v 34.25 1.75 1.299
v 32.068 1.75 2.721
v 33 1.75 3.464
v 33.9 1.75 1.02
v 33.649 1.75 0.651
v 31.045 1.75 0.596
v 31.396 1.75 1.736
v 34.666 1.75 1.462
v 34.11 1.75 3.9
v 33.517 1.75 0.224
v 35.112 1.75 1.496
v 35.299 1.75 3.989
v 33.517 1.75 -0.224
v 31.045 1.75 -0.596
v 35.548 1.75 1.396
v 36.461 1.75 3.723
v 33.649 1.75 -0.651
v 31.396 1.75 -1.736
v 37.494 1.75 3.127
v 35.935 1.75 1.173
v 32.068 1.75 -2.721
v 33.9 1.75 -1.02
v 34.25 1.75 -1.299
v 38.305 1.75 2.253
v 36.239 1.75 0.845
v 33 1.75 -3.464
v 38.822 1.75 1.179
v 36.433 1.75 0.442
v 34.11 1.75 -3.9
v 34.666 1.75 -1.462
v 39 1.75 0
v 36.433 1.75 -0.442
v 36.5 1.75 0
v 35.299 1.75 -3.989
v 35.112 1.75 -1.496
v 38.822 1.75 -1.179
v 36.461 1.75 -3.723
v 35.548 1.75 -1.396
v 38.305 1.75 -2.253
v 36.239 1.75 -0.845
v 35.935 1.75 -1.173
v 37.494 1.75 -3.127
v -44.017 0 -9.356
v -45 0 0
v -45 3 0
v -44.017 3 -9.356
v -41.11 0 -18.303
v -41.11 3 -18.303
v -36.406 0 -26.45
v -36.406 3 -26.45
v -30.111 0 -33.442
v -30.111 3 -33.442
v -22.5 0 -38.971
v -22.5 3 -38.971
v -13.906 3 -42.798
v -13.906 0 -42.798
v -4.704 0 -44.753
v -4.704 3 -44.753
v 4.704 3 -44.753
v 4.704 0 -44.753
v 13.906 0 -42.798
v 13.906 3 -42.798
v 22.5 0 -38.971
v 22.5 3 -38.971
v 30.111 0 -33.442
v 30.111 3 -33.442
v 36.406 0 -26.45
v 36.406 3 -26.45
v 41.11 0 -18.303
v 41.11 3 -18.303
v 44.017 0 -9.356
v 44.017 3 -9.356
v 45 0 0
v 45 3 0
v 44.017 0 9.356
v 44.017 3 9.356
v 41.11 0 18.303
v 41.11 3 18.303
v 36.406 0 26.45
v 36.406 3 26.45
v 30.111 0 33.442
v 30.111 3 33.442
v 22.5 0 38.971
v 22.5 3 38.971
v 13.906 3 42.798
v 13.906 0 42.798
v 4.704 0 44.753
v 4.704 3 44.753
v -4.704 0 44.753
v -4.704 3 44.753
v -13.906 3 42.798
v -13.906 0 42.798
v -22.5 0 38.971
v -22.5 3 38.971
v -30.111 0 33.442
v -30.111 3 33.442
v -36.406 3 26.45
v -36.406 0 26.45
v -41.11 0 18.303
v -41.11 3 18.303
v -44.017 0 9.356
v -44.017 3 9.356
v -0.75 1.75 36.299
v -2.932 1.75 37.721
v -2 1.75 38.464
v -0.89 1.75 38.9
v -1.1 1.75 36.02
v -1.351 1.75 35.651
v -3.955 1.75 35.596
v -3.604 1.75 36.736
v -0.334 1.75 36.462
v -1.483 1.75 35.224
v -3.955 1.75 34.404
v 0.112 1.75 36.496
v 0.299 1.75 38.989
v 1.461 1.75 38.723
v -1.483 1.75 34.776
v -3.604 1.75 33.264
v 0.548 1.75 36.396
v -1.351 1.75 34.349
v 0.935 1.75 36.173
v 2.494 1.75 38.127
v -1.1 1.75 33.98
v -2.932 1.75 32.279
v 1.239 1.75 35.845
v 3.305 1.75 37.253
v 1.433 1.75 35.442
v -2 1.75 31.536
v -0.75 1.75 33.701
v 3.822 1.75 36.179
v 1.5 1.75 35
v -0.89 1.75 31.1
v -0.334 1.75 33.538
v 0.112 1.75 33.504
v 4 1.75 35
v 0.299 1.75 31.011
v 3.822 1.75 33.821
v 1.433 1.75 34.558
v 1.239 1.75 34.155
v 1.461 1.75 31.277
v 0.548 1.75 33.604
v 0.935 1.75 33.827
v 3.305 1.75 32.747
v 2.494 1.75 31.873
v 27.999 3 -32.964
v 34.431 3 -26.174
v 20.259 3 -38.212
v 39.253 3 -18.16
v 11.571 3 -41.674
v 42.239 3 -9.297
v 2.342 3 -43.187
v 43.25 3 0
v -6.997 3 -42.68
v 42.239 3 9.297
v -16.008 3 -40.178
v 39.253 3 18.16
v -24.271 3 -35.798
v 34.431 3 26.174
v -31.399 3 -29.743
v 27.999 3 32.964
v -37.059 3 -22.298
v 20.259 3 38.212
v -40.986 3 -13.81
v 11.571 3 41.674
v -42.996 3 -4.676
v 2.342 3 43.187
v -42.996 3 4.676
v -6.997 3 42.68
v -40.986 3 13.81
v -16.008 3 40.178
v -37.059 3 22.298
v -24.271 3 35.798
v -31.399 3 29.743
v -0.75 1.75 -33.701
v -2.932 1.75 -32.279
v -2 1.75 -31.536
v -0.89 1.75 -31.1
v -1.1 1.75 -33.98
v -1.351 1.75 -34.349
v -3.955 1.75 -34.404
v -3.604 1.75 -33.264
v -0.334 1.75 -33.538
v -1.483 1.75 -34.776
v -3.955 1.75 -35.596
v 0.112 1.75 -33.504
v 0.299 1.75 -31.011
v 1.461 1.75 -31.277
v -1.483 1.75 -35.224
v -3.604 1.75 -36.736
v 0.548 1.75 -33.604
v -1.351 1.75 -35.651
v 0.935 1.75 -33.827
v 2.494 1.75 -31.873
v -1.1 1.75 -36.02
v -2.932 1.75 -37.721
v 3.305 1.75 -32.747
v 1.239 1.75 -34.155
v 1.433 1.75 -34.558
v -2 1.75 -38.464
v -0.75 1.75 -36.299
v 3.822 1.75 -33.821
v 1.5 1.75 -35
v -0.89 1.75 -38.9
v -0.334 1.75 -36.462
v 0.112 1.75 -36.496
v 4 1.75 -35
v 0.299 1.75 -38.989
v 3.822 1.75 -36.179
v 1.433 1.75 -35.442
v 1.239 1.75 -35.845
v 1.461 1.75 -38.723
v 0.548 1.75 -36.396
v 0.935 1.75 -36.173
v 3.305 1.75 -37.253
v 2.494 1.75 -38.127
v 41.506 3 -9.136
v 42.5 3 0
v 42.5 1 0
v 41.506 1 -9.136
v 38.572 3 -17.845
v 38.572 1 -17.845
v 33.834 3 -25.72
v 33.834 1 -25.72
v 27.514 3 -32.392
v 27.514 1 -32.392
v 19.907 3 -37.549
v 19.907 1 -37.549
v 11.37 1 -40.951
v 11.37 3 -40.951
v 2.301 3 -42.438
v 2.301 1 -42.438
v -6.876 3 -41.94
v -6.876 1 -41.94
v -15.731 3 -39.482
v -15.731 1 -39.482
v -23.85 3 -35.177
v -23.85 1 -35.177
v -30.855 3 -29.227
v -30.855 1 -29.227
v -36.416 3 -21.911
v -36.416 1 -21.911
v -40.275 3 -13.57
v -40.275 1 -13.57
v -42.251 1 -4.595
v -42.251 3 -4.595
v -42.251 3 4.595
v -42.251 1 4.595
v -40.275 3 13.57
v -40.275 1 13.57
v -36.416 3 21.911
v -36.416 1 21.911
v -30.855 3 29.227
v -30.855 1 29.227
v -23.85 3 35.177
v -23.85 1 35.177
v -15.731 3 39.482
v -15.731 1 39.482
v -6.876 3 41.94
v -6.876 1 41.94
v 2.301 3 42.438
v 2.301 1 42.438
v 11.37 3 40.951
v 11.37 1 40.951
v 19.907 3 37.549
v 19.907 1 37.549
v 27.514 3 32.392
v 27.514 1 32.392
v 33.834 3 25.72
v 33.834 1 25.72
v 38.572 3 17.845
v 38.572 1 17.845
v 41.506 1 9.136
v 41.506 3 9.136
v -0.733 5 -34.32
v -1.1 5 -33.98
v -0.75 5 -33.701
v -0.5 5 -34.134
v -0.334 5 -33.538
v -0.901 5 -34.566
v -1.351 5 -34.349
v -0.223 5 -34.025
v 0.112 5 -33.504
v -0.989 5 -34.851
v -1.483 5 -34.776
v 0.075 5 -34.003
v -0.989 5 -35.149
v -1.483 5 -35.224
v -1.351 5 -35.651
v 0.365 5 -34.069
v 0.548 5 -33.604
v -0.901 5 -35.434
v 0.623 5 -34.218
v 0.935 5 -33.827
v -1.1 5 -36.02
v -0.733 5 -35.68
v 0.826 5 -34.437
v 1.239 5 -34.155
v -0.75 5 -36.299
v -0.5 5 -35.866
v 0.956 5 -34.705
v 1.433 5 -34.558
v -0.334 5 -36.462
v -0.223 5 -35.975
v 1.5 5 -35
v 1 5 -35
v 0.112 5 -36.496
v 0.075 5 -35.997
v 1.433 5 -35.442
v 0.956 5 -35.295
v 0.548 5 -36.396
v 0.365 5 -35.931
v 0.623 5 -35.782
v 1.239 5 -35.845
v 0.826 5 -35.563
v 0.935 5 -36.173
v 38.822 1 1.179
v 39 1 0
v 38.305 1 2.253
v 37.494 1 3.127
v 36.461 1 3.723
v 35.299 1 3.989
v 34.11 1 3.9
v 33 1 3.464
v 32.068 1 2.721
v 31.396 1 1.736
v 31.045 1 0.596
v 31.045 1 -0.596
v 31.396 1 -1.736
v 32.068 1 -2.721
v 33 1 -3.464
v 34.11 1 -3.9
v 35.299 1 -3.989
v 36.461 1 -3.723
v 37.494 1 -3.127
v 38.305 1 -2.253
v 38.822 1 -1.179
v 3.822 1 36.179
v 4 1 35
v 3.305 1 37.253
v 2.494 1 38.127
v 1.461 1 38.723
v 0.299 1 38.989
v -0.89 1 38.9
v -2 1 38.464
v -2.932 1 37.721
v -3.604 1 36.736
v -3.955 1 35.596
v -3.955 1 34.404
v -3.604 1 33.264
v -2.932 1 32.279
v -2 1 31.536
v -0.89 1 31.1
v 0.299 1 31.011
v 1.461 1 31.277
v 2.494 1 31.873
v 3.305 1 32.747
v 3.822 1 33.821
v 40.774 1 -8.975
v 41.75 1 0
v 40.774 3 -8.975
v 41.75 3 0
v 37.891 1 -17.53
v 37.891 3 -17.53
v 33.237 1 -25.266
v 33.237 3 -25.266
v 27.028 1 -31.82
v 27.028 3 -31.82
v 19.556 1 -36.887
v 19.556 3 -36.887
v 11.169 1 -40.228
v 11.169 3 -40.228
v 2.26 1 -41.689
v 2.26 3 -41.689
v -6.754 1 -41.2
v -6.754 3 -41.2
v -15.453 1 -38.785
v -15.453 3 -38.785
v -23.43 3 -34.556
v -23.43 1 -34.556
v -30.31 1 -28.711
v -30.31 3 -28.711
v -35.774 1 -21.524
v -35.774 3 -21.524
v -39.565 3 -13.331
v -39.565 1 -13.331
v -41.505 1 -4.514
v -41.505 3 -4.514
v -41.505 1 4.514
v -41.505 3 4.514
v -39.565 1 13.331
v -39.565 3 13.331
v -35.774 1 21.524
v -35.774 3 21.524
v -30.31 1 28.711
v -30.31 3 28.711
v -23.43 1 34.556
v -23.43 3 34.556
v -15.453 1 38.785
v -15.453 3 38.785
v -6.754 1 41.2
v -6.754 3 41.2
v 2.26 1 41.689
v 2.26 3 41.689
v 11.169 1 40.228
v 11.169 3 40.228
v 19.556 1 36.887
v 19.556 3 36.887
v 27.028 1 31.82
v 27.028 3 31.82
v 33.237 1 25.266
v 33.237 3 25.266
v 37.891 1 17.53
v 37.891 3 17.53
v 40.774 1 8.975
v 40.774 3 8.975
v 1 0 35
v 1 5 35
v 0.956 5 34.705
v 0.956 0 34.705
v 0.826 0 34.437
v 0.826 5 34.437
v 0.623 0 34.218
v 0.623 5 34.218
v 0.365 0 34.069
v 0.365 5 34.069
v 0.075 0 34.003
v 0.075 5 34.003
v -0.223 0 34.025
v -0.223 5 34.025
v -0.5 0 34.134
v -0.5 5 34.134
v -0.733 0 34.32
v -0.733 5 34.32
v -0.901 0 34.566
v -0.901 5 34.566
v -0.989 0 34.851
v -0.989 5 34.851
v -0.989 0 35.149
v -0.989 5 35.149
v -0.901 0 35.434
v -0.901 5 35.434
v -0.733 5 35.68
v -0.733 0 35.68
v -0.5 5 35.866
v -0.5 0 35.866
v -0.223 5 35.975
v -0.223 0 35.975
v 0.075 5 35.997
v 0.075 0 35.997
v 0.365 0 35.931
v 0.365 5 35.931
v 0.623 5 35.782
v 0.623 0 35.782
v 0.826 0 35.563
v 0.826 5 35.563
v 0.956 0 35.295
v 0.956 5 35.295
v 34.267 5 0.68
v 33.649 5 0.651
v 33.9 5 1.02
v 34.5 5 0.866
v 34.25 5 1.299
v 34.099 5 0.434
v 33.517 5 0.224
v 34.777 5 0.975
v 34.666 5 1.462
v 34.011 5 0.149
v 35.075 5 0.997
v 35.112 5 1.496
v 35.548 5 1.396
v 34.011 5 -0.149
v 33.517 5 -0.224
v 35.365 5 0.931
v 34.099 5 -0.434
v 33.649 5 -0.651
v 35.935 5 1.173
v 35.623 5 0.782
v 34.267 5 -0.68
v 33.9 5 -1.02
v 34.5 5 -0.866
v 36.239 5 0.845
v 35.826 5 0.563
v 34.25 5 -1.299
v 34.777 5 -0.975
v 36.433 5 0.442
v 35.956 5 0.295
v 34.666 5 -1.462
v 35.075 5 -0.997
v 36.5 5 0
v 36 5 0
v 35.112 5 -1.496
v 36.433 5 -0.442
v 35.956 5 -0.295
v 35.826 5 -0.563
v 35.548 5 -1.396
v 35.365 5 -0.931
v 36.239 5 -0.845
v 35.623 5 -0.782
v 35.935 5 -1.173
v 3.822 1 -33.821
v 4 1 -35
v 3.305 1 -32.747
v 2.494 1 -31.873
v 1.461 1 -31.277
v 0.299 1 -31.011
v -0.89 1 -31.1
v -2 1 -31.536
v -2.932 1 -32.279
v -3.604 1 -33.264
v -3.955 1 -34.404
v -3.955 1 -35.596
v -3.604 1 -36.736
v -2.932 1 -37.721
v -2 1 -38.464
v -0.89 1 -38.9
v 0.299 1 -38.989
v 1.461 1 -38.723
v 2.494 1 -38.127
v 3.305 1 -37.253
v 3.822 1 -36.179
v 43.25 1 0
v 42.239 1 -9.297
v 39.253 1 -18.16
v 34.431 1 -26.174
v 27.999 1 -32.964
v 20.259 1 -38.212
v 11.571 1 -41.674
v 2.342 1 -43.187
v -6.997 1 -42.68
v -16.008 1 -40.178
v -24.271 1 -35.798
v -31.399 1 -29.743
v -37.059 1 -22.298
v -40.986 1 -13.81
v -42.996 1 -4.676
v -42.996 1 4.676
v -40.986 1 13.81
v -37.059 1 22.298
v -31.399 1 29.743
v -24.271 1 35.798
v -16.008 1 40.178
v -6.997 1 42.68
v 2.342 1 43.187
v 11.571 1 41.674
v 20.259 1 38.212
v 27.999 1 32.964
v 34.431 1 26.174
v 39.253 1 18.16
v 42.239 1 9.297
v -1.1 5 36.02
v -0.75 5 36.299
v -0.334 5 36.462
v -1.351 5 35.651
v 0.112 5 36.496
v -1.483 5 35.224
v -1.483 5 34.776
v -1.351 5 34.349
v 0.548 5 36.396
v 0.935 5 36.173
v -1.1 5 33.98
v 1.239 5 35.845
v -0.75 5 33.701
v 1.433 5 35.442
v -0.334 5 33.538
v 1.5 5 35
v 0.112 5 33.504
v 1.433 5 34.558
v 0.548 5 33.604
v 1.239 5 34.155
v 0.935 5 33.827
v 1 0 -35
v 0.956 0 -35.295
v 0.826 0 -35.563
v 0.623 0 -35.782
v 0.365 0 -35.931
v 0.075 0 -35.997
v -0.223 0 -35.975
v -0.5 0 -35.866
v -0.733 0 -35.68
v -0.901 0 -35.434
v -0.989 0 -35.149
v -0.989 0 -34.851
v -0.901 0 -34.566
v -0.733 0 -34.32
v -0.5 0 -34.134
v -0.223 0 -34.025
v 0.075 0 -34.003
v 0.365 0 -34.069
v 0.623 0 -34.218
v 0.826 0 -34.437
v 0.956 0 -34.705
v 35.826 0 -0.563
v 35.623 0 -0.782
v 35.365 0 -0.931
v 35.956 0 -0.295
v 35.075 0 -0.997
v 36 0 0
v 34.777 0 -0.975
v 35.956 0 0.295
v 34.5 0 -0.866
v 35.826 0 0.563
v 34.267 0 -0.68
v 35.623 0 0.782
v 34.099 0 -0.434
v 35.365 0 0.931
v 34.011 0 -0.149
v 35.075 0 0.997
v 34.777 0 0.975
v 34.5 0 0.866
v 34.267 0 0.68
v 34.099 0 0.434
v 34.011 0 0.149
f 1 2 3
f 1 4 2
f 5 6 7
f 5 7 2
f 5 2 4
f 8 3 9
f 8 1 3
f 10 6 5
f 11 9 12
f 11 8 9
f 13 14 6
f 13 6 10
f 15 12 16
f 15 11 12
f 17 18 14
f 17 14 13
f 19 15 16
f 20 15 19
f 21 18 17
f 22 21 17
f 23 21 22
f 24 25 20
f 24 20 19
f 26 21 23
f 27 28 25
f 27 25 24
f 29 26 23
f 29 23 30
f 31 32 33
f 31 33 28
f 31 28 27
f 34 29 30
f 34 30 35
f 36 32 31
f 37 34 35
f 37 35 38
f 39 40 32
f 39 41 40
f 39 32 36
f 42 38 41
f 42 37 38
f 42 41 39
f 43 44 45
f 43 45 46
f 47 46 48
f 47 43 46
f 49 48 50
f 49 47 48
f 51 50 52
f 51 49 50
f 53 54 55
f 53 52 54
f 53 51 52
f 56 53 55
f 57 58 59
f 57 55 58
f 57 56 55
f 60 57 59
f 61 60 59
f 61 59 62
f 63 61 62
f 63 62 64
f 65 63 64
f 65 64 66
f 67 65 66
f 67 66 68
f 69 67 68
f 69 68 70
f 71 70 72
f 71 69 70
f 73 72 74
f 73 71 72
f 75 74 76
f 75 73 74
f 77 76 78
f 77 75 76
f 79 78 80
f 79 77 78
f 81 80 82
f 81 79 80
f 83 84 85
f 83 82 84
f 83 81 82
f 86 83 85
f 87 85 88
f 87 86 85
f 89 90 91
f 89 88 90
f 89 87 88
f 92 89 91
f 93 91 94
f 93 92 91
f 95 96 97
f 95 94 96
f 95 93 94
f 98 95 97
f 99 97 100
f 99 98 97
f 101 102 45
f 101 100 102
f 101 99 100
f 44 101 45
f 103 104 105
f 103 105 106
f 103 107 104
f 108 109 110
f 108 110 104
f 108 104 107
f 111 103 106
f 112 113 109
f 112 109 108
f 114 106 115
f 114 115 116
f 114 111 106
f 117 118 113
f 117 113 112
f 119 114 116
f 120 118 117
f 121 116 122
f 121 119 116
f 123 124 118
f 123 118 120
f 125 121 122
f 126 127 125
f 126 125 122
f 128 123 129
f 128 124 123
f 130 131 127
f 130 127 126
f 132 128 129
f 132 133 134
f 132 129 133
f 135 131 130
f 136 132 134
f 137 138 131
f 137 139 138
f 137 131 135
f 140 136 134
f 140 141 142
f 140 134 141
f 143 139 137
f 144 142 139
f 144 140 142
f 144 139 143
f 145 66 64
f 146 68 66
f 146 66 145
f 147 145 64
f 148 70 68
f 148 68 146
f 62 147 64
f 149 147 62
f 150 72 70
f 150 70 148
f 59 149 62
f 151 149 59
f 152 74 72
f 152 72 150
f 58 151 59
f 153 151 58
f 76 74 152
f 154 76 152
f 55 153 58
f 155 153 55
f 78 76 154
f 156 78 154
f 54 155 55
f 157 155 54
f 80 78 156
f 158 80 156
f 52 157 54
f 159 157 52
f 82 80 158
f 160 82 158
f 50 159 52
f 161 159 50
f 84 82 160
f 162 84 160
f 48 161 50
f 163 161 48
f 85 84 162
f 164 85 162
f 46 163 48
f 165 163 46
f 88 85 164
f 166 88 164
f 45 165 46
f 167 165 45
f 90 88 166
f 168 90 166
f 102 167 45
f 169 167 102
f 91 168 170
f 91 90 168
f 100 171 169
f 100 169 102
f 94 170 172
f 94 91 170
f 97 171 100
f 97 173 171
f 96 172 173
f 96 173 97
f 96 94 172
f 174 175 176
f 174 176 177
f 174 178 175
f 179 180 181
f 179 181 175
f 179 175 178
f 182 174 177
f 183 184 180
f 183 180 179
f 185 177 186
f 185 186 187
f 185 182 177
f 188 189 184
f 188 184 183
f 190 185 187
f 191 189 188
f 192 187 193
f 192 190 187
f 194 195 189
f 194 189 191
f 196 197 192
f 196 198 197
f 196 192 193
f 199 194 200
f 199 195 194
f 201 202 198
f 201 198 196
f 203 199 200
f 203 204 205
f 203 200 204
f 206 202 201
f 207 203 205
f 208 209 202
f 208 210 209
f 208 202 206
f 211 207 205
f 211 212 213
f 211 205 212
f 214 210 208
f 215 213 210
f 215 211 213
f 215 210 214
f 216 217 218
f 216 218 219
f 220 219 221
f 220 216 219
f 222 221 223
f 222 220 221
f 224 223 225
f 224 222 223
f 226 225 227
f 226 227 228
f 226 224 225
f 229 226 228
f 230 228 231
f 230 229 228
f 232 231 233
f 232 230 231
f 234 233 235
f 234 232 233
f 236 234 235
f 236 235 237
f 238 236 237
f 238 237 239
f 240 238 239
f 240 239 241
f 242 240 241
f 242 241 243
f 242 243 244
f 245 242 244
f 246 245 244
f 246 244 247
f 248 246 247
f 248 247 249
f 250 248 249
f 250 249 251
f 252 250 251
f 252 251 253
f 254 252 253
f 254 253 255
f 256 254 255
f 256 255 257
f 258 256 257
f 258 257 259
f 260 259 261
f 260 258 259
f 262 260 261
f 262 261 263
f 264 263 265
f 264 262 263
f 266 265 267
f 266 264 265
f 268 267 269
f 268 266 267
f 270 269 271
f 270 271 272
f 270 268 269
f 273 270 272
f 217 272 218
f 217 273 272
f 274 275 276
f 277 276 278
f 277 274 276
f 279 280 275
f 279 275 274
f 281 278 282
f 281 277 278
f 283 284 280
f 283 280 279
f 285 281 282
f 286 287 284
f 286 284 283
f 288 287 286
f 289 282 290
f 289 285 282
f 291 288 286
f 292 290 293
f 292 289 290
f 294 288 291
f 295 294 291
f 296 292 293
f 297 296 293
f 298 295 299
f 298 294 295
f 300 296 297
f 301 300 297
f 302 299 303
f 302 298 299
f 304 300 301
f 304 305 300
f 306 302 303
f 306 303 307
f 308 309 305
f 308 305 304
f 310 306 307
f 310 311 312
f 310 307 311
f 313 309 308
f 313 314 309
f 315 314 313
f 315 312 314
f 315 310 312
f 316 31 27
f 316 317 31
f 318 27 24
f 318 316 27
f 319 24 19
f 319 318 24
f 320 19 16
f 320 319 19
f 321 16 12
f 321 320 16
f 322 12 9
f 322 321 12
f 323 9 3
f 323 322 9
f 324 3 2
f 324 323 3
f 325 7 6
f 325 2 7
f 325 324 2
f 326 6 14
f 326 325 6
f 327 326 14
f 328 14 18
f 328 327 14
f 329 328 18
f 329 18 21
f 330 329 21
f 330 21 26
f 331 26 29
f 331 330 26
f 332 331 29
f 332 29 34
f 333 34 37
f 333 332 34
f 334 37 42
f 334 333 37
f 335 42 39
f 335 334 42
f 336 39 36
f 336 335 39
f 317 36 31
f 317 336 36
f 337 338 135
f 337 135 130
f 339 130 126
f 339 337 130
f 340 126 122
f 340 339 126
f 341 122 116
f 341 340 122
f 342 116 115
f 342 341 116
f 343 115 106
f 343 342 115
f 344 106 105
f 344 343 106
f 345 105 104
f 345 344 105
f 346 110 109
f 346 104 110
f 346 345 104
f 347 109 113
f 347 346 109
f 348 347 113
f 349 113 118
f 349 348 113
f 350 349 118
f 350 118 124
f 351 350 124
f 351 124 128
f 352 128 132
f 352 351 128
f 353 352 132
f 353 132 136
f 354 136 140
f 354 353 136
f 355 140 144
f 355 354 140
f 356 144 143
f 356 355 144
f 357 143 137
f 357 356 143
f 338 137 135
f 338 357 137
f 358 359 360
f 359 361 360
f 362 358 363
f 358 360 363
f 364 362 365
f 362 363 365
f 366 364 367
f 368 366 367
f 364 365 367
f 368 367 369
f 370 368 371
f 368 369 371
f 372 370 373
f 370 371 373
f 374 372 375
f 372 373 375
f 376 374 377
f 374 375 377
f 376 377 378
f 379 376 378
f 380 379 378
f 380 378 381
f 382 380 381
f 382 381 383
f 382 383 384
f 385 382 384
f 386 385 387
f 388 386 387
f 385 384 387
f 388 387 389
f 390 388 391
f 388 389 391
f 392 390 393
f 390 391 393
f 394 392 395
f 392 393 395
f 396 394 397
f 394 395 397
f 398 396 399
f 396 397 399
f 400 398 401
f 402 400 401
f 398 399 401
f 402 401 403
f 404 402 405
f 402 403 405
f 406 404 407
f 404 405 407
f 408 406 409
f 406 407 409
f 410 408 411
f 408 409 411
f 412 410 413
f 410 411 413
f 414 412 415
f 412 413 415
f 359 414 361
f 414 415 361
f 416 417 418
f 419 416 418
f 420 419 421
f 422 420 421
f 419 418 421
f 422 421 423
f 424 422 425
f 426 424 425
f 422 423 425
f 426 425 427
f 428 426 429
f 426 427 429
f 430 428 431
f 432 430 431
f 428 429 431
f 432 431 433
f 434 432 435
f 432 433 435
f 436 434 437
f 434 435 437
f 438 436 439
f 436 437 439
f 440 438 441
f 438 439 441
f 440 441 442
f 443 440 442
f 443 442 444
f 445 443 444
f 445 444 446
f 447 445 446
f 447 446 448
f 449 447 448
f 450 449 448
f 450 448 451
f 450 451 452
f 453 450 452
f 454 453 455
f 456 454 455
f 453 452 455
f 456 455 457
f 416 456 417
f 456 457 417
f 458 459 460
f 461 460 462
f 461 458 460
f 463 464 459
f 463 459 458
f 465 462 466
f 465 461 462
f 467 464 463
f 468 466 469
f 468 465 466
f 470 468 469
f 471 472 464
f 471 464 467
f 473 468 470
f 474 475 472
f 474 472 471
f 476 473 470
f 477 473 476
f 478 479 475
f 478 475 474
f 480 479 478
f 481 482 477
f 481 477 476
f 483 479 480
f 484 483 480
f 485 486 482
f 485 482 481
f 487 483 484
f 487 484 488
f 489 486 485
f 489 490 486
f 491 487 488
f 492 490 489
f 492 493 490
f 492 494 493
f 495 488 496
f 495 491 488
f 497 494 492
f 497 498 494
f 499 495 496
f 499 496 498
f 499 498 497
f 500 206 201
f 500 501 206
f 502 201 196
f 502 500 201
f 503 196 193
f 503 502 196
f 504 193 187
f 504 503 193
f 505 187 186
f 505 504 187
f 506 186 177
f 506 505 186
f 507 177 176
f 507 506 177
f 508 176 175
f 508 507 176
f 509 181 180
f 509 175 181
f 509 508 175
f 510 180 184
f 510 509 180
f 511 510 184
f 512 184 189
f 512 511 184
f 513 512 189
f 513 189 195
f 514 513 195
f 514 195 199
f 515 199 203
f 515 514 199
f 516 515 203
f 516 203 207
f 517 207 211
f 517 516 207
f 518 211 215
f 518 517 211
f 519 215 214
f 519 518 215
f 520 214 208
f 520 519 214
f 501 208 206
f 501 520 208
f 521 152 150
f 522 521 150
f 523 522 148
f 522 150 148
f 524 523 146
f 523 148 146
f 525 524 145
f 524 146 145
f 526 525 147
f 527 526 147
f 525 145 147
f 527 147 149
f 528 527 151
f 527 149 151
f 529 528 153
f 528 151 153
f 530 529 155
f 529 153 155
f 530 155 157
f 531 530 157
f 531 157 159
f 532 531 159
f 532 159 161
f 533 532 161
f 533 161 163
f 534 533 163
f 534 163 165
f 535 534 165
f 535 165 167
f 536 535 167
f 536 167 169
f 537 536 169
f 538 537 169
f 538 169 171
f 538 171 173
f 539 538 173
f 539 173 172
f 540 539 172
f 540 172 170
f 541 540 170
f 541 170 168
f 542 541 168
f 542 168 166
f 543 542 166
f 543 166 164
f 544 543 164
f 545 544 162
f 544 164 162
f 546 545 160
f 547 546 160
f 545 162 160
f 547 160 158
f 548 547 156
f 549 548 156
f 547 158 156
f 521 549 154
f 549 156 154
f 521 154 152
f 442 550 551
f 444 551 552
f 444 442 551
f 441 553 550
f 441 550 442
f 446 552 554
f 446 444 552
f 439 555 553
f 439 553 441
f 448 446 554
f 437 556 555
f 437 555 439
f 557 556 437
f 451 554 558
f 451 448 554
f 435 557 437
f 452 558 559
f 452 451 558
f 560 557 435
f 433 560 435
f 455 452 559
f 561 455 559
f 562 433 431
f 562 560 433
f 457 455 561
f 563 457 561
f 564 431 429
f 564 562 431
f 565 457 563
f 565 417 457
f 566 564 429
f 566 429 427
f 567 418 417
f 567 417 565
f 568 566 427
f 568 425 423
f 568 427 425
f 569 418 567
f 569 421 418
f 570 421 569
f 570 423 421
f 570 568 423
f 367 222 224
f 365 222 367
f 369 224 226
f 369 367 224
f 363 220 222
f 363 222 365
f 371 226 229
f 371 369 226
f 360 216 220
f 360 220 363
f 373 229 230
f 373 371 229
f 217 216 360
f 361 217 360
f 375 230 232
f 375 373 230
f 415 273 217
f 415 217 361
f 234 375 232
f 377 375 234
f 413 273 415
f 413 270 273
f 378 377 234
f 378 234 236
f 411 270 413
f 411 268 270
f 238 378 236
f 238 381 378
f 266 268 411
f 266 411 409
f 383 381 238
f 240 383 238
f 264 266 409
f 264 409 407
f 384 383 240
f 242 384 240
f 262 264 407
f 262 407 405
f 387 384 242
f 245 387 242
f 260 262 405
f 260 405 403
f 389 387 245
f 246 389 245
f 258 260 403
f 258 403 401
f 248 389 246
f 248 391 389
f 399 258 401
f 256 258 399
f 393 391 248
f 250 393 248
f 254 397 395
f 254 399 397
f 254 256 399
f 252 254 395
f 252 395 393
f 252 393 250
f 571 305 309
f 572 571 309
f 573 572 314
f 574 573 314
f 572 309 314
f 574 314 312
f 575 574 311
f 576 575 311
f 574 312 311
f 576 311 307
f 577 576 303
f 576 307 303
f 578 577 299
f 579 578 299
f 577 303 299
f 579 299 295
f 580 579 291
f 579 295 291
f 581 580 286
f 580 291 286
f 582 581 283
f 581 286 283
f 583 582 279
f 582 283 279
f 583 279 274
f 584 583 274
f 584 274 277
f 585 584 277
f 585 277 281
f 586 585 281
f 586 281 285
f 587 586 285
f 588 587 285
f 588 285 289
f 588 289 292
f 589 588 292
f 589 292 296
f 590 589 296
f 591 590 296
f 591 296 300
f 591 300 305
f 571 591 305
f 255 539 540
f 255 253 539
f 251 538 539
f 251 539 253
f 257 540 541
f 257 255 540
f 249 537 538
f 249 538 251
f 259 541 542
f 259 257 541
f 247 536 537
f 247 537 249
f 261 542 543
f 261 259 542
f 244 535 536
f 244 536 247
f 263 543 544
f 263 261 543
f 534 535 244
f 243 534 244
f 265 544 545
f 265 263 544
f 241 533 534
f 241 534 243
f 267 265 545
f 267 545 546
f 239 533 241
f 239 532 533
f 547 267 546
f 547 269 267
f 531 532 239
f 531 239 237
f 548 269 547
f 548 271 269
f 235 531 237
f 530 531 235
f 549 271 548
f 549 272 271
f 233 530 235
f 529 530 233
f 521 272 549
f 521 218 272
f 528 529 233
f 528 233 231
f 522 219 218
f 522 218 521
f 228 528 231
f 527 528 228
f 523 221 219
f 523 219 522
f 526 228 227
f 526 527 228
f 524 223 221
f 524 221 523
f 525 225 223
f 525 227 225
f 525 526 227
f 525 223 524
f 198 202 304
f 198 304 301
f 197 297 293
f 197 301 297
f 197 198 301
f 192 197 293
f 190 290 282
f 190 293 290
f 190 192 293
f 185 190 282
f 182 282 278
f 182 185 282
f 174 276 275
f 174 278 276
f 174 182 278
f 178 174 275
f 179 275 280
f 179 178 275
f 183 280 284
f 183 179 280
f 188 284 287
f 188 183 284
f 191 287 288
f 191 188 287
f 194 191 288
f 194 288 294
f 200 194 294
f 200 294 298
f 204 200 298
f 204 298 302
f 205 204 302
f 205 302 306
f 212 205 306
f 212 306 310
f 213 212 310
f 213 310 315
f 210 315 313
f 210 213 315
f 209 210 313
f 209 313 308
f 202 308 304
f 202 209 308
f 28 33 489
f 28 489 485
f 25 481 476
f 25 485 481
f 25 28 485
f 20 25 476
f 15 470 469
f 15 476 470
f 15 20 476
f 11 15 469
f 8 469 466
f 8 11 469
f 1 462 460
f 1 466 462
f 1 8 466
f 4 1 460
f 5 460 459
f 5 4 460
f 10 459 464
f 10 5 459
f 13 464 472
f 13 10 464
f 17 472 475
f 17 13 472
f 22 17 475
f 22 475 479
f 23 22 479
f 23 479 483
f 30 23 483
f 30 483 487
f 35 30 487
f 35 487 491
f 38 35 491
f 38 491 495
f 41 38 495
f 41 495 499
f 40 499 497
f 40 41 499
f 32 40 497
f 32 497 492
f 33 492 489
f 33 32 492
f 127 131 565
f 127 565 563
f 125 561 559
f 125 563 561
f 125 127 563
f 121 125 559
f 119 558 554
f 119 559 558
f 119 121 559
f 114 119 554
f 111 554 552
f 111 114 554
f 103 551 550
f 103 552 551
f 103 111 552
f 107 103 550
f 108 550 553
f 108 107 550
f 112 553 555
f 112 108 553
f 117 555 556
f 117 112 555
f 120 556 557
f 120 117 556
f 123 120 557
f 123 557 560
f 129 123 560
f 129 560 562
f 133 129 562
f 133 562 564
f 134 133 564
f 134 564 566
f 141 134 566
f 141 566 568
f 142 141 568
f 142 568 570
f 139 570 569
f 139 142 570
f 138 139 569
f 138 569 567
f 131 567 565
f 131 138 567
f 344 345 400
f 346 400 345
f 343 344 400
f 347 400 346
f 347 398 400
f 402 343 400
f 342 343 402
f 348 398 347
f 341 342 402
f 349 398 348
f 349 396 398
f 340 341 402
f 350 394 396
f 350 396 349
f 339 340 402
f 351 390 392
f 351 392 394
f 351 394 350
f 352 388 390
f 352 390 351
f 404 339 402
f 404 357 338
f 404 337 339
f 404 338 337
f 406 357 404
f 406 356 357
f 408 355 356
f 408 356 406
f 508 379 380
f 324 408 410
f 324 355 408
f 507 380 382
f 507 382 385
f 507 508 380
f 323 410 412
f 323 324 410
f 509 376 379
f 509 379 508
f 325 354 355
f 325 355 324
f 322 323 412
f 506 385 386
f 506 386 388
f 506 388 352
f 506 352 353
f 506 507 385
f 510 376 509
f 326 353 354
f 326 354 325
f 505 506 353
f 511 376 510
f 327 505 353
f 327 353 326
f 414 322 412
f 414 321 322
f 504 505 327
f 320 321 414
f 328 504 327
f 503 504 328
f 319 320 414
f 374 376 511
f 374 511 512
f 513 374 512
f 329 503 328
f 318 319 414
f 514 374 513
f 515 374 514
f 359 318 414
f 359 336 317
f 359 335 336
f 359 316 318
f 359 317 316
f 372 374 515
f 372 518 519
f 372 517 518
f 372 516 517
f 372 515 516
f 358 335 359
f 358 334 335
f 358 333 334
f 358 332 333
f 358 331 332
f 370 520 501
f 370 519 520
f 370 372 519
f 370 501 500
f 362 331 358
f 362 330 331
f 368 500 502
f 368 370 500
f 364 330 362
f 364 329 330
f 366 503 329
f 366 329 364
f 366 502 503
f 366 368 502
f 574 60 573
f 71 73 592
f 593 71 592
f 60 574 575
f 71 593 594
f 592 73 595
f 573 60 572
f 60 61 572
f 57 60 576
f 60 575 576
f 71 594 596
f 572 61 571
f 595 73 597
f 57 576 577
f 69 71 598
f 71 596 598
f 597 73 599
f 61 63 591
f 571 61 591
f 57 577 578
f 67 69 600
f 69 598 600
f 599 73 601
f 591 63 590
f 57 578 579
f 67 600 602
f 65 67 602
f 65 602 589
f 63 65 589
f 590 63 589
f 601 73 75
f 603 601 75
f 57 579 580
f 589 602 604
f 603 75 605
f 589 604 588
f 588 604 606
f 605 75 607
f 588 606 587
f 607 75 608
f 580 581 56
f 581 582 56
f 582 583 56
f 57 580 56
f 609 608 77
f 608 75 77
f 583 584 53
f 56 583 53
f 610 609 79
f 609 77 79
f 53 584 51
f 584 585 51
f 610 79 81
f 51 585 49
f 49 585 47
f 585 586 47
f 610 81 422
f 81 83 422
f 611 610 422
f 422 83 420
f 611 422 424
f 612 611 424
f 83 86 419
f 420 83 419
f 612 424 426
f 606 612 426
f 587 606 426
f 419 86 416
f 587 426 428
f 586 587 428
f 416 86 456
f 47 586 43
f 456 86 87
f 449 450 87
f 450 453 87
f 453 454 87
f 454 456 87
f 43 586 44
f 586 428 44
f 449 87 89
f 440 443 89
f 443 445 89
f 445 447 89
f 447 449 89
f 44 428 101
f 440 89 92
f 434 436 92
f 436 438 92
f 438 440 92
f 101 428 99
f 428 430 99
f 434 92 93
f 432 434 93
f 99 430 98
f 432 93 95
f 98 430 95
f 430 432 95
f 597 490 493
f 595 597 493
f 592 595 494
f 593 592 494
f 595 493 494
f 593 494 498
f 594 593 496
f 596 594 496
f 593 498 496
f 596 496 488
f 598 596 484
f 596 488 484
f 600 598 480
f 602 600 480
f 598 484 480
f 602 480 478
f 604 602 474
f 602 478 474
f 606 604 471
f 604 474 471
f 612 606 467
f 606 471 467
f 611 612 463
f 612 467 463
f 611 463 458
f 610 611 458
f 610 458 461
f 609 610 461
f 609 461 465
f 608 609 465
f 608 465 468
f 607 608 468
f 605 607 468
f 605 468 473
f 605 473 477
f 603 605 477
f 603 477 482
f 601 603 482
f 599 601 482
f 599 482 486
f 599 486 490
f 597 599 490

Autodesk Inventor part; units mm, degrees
ref_plane "YZ Plane" through (0, 0, 0) normal (1, 0, 0) x (0, 1, 0)
ref_plane "XZ Plane" through (0, 0, 0) normal (0, 1, 0) x (-1, 0, 0)
ref_plane "XY Plane" through (0, 0, 0) normal (0, 0, 1) x (1, 0, 0)
sketch "Sketch1" plane through (0, 0, 0) normal (0, 1, 0) x (-1, 0, 0)
  circle A0 centre (0, 0) radius 45
  dimension "d0" = 90
extrude "Extrusion1" add sketch "Sketch1" along normal blind 3
sketch "Sketch2" plane through (0, 3, 0) normal (0, 1, 0) x (1, 0, 0)
  circle A0 centre (0, 0) radius 45 projected
  circle A1 centre (0, 0) radius 42.5
  circle A2 centre (0, 0) radius 43.25
  circle A3 centre (0, 0) radius 41.75
  dimension "d3" = 2.5
  dimension "d4" = 0.75
  dimension "d5" = 0.75
extrude "Extrusion2" cut sketch "Sketch2" against normal blind 2 contours A3
extrude "Extrusion3" cut sketch "Sketch2" against normal blind 2 contours A2
sketch "Sketch3" plane through (0, 1, 0) normal (0, 1, 0) x (1, 0, 0)
  circle A0 centre (0, 0) radius 40 construction
  line L0 (-40, 0) -> (40, 0) construction
  line L1 (0, 40) -> (0, -40) construction
  circle A1 centre (0, 35) radius 1.5
  circle A2 centre (35, 0) radius 1.5
  circle A3 centre (0, -35) radius 1.5
  circle A4 centre (0, 35) radius 4
  circle A5 centre (35, 0) radius 4
  circle A6 centre (0, -35) radius 4
  dimension "d10" = 80
  dimension "d12" = 3
  dimension "d13" = 3
  dimension "d14" = 5
  dimension "d15" = 5
  dimension "d17" = 3
  dimension "d18" = 5
  dimension "d19" = 2.5
  dimension "d20" = 2.5
  dimension "d21" = 2.5
extrude "Extrusion4" add sketch "Sketch3" along normal blind 0.75
extrude "Extrusion6" add sketch "Sketch3" along normal blind 4 contours A1 | A2 | A3
sketch "Sketch5" plane through (35, 5, 0) normal (0, 1, 0) x (1, 0, 0)
  circle A0 centre (0, 0) radius 4 projected
  circle A1 centre (-35, -35) radius 4 projected
  circle A2 centre (-35, 35) radius 4 projected
  circle A3 centre (-35, 35) radius 1.5 projected
  circle A4 centre (-35, 35) radius 1
  circle A5 centre (0, 0) radius 1.5 projected
  circle A6 centre (0, 0) radius 1
  circle A7 centre (-35, -35) radius 1.5 projected
  circle A8 centre (-35, -35) radius 1
  point P0 (-35, 0)
  dimension "d30" = 0.5
  dimension "d31" = 0.5
  dimension "d32" = 0.5
extrude "Extrusion7" cut sketch "Sketch5" against normal through all contours A4 | A6 | A8
properties part number "ROUNDBOTTOMCOVER"
